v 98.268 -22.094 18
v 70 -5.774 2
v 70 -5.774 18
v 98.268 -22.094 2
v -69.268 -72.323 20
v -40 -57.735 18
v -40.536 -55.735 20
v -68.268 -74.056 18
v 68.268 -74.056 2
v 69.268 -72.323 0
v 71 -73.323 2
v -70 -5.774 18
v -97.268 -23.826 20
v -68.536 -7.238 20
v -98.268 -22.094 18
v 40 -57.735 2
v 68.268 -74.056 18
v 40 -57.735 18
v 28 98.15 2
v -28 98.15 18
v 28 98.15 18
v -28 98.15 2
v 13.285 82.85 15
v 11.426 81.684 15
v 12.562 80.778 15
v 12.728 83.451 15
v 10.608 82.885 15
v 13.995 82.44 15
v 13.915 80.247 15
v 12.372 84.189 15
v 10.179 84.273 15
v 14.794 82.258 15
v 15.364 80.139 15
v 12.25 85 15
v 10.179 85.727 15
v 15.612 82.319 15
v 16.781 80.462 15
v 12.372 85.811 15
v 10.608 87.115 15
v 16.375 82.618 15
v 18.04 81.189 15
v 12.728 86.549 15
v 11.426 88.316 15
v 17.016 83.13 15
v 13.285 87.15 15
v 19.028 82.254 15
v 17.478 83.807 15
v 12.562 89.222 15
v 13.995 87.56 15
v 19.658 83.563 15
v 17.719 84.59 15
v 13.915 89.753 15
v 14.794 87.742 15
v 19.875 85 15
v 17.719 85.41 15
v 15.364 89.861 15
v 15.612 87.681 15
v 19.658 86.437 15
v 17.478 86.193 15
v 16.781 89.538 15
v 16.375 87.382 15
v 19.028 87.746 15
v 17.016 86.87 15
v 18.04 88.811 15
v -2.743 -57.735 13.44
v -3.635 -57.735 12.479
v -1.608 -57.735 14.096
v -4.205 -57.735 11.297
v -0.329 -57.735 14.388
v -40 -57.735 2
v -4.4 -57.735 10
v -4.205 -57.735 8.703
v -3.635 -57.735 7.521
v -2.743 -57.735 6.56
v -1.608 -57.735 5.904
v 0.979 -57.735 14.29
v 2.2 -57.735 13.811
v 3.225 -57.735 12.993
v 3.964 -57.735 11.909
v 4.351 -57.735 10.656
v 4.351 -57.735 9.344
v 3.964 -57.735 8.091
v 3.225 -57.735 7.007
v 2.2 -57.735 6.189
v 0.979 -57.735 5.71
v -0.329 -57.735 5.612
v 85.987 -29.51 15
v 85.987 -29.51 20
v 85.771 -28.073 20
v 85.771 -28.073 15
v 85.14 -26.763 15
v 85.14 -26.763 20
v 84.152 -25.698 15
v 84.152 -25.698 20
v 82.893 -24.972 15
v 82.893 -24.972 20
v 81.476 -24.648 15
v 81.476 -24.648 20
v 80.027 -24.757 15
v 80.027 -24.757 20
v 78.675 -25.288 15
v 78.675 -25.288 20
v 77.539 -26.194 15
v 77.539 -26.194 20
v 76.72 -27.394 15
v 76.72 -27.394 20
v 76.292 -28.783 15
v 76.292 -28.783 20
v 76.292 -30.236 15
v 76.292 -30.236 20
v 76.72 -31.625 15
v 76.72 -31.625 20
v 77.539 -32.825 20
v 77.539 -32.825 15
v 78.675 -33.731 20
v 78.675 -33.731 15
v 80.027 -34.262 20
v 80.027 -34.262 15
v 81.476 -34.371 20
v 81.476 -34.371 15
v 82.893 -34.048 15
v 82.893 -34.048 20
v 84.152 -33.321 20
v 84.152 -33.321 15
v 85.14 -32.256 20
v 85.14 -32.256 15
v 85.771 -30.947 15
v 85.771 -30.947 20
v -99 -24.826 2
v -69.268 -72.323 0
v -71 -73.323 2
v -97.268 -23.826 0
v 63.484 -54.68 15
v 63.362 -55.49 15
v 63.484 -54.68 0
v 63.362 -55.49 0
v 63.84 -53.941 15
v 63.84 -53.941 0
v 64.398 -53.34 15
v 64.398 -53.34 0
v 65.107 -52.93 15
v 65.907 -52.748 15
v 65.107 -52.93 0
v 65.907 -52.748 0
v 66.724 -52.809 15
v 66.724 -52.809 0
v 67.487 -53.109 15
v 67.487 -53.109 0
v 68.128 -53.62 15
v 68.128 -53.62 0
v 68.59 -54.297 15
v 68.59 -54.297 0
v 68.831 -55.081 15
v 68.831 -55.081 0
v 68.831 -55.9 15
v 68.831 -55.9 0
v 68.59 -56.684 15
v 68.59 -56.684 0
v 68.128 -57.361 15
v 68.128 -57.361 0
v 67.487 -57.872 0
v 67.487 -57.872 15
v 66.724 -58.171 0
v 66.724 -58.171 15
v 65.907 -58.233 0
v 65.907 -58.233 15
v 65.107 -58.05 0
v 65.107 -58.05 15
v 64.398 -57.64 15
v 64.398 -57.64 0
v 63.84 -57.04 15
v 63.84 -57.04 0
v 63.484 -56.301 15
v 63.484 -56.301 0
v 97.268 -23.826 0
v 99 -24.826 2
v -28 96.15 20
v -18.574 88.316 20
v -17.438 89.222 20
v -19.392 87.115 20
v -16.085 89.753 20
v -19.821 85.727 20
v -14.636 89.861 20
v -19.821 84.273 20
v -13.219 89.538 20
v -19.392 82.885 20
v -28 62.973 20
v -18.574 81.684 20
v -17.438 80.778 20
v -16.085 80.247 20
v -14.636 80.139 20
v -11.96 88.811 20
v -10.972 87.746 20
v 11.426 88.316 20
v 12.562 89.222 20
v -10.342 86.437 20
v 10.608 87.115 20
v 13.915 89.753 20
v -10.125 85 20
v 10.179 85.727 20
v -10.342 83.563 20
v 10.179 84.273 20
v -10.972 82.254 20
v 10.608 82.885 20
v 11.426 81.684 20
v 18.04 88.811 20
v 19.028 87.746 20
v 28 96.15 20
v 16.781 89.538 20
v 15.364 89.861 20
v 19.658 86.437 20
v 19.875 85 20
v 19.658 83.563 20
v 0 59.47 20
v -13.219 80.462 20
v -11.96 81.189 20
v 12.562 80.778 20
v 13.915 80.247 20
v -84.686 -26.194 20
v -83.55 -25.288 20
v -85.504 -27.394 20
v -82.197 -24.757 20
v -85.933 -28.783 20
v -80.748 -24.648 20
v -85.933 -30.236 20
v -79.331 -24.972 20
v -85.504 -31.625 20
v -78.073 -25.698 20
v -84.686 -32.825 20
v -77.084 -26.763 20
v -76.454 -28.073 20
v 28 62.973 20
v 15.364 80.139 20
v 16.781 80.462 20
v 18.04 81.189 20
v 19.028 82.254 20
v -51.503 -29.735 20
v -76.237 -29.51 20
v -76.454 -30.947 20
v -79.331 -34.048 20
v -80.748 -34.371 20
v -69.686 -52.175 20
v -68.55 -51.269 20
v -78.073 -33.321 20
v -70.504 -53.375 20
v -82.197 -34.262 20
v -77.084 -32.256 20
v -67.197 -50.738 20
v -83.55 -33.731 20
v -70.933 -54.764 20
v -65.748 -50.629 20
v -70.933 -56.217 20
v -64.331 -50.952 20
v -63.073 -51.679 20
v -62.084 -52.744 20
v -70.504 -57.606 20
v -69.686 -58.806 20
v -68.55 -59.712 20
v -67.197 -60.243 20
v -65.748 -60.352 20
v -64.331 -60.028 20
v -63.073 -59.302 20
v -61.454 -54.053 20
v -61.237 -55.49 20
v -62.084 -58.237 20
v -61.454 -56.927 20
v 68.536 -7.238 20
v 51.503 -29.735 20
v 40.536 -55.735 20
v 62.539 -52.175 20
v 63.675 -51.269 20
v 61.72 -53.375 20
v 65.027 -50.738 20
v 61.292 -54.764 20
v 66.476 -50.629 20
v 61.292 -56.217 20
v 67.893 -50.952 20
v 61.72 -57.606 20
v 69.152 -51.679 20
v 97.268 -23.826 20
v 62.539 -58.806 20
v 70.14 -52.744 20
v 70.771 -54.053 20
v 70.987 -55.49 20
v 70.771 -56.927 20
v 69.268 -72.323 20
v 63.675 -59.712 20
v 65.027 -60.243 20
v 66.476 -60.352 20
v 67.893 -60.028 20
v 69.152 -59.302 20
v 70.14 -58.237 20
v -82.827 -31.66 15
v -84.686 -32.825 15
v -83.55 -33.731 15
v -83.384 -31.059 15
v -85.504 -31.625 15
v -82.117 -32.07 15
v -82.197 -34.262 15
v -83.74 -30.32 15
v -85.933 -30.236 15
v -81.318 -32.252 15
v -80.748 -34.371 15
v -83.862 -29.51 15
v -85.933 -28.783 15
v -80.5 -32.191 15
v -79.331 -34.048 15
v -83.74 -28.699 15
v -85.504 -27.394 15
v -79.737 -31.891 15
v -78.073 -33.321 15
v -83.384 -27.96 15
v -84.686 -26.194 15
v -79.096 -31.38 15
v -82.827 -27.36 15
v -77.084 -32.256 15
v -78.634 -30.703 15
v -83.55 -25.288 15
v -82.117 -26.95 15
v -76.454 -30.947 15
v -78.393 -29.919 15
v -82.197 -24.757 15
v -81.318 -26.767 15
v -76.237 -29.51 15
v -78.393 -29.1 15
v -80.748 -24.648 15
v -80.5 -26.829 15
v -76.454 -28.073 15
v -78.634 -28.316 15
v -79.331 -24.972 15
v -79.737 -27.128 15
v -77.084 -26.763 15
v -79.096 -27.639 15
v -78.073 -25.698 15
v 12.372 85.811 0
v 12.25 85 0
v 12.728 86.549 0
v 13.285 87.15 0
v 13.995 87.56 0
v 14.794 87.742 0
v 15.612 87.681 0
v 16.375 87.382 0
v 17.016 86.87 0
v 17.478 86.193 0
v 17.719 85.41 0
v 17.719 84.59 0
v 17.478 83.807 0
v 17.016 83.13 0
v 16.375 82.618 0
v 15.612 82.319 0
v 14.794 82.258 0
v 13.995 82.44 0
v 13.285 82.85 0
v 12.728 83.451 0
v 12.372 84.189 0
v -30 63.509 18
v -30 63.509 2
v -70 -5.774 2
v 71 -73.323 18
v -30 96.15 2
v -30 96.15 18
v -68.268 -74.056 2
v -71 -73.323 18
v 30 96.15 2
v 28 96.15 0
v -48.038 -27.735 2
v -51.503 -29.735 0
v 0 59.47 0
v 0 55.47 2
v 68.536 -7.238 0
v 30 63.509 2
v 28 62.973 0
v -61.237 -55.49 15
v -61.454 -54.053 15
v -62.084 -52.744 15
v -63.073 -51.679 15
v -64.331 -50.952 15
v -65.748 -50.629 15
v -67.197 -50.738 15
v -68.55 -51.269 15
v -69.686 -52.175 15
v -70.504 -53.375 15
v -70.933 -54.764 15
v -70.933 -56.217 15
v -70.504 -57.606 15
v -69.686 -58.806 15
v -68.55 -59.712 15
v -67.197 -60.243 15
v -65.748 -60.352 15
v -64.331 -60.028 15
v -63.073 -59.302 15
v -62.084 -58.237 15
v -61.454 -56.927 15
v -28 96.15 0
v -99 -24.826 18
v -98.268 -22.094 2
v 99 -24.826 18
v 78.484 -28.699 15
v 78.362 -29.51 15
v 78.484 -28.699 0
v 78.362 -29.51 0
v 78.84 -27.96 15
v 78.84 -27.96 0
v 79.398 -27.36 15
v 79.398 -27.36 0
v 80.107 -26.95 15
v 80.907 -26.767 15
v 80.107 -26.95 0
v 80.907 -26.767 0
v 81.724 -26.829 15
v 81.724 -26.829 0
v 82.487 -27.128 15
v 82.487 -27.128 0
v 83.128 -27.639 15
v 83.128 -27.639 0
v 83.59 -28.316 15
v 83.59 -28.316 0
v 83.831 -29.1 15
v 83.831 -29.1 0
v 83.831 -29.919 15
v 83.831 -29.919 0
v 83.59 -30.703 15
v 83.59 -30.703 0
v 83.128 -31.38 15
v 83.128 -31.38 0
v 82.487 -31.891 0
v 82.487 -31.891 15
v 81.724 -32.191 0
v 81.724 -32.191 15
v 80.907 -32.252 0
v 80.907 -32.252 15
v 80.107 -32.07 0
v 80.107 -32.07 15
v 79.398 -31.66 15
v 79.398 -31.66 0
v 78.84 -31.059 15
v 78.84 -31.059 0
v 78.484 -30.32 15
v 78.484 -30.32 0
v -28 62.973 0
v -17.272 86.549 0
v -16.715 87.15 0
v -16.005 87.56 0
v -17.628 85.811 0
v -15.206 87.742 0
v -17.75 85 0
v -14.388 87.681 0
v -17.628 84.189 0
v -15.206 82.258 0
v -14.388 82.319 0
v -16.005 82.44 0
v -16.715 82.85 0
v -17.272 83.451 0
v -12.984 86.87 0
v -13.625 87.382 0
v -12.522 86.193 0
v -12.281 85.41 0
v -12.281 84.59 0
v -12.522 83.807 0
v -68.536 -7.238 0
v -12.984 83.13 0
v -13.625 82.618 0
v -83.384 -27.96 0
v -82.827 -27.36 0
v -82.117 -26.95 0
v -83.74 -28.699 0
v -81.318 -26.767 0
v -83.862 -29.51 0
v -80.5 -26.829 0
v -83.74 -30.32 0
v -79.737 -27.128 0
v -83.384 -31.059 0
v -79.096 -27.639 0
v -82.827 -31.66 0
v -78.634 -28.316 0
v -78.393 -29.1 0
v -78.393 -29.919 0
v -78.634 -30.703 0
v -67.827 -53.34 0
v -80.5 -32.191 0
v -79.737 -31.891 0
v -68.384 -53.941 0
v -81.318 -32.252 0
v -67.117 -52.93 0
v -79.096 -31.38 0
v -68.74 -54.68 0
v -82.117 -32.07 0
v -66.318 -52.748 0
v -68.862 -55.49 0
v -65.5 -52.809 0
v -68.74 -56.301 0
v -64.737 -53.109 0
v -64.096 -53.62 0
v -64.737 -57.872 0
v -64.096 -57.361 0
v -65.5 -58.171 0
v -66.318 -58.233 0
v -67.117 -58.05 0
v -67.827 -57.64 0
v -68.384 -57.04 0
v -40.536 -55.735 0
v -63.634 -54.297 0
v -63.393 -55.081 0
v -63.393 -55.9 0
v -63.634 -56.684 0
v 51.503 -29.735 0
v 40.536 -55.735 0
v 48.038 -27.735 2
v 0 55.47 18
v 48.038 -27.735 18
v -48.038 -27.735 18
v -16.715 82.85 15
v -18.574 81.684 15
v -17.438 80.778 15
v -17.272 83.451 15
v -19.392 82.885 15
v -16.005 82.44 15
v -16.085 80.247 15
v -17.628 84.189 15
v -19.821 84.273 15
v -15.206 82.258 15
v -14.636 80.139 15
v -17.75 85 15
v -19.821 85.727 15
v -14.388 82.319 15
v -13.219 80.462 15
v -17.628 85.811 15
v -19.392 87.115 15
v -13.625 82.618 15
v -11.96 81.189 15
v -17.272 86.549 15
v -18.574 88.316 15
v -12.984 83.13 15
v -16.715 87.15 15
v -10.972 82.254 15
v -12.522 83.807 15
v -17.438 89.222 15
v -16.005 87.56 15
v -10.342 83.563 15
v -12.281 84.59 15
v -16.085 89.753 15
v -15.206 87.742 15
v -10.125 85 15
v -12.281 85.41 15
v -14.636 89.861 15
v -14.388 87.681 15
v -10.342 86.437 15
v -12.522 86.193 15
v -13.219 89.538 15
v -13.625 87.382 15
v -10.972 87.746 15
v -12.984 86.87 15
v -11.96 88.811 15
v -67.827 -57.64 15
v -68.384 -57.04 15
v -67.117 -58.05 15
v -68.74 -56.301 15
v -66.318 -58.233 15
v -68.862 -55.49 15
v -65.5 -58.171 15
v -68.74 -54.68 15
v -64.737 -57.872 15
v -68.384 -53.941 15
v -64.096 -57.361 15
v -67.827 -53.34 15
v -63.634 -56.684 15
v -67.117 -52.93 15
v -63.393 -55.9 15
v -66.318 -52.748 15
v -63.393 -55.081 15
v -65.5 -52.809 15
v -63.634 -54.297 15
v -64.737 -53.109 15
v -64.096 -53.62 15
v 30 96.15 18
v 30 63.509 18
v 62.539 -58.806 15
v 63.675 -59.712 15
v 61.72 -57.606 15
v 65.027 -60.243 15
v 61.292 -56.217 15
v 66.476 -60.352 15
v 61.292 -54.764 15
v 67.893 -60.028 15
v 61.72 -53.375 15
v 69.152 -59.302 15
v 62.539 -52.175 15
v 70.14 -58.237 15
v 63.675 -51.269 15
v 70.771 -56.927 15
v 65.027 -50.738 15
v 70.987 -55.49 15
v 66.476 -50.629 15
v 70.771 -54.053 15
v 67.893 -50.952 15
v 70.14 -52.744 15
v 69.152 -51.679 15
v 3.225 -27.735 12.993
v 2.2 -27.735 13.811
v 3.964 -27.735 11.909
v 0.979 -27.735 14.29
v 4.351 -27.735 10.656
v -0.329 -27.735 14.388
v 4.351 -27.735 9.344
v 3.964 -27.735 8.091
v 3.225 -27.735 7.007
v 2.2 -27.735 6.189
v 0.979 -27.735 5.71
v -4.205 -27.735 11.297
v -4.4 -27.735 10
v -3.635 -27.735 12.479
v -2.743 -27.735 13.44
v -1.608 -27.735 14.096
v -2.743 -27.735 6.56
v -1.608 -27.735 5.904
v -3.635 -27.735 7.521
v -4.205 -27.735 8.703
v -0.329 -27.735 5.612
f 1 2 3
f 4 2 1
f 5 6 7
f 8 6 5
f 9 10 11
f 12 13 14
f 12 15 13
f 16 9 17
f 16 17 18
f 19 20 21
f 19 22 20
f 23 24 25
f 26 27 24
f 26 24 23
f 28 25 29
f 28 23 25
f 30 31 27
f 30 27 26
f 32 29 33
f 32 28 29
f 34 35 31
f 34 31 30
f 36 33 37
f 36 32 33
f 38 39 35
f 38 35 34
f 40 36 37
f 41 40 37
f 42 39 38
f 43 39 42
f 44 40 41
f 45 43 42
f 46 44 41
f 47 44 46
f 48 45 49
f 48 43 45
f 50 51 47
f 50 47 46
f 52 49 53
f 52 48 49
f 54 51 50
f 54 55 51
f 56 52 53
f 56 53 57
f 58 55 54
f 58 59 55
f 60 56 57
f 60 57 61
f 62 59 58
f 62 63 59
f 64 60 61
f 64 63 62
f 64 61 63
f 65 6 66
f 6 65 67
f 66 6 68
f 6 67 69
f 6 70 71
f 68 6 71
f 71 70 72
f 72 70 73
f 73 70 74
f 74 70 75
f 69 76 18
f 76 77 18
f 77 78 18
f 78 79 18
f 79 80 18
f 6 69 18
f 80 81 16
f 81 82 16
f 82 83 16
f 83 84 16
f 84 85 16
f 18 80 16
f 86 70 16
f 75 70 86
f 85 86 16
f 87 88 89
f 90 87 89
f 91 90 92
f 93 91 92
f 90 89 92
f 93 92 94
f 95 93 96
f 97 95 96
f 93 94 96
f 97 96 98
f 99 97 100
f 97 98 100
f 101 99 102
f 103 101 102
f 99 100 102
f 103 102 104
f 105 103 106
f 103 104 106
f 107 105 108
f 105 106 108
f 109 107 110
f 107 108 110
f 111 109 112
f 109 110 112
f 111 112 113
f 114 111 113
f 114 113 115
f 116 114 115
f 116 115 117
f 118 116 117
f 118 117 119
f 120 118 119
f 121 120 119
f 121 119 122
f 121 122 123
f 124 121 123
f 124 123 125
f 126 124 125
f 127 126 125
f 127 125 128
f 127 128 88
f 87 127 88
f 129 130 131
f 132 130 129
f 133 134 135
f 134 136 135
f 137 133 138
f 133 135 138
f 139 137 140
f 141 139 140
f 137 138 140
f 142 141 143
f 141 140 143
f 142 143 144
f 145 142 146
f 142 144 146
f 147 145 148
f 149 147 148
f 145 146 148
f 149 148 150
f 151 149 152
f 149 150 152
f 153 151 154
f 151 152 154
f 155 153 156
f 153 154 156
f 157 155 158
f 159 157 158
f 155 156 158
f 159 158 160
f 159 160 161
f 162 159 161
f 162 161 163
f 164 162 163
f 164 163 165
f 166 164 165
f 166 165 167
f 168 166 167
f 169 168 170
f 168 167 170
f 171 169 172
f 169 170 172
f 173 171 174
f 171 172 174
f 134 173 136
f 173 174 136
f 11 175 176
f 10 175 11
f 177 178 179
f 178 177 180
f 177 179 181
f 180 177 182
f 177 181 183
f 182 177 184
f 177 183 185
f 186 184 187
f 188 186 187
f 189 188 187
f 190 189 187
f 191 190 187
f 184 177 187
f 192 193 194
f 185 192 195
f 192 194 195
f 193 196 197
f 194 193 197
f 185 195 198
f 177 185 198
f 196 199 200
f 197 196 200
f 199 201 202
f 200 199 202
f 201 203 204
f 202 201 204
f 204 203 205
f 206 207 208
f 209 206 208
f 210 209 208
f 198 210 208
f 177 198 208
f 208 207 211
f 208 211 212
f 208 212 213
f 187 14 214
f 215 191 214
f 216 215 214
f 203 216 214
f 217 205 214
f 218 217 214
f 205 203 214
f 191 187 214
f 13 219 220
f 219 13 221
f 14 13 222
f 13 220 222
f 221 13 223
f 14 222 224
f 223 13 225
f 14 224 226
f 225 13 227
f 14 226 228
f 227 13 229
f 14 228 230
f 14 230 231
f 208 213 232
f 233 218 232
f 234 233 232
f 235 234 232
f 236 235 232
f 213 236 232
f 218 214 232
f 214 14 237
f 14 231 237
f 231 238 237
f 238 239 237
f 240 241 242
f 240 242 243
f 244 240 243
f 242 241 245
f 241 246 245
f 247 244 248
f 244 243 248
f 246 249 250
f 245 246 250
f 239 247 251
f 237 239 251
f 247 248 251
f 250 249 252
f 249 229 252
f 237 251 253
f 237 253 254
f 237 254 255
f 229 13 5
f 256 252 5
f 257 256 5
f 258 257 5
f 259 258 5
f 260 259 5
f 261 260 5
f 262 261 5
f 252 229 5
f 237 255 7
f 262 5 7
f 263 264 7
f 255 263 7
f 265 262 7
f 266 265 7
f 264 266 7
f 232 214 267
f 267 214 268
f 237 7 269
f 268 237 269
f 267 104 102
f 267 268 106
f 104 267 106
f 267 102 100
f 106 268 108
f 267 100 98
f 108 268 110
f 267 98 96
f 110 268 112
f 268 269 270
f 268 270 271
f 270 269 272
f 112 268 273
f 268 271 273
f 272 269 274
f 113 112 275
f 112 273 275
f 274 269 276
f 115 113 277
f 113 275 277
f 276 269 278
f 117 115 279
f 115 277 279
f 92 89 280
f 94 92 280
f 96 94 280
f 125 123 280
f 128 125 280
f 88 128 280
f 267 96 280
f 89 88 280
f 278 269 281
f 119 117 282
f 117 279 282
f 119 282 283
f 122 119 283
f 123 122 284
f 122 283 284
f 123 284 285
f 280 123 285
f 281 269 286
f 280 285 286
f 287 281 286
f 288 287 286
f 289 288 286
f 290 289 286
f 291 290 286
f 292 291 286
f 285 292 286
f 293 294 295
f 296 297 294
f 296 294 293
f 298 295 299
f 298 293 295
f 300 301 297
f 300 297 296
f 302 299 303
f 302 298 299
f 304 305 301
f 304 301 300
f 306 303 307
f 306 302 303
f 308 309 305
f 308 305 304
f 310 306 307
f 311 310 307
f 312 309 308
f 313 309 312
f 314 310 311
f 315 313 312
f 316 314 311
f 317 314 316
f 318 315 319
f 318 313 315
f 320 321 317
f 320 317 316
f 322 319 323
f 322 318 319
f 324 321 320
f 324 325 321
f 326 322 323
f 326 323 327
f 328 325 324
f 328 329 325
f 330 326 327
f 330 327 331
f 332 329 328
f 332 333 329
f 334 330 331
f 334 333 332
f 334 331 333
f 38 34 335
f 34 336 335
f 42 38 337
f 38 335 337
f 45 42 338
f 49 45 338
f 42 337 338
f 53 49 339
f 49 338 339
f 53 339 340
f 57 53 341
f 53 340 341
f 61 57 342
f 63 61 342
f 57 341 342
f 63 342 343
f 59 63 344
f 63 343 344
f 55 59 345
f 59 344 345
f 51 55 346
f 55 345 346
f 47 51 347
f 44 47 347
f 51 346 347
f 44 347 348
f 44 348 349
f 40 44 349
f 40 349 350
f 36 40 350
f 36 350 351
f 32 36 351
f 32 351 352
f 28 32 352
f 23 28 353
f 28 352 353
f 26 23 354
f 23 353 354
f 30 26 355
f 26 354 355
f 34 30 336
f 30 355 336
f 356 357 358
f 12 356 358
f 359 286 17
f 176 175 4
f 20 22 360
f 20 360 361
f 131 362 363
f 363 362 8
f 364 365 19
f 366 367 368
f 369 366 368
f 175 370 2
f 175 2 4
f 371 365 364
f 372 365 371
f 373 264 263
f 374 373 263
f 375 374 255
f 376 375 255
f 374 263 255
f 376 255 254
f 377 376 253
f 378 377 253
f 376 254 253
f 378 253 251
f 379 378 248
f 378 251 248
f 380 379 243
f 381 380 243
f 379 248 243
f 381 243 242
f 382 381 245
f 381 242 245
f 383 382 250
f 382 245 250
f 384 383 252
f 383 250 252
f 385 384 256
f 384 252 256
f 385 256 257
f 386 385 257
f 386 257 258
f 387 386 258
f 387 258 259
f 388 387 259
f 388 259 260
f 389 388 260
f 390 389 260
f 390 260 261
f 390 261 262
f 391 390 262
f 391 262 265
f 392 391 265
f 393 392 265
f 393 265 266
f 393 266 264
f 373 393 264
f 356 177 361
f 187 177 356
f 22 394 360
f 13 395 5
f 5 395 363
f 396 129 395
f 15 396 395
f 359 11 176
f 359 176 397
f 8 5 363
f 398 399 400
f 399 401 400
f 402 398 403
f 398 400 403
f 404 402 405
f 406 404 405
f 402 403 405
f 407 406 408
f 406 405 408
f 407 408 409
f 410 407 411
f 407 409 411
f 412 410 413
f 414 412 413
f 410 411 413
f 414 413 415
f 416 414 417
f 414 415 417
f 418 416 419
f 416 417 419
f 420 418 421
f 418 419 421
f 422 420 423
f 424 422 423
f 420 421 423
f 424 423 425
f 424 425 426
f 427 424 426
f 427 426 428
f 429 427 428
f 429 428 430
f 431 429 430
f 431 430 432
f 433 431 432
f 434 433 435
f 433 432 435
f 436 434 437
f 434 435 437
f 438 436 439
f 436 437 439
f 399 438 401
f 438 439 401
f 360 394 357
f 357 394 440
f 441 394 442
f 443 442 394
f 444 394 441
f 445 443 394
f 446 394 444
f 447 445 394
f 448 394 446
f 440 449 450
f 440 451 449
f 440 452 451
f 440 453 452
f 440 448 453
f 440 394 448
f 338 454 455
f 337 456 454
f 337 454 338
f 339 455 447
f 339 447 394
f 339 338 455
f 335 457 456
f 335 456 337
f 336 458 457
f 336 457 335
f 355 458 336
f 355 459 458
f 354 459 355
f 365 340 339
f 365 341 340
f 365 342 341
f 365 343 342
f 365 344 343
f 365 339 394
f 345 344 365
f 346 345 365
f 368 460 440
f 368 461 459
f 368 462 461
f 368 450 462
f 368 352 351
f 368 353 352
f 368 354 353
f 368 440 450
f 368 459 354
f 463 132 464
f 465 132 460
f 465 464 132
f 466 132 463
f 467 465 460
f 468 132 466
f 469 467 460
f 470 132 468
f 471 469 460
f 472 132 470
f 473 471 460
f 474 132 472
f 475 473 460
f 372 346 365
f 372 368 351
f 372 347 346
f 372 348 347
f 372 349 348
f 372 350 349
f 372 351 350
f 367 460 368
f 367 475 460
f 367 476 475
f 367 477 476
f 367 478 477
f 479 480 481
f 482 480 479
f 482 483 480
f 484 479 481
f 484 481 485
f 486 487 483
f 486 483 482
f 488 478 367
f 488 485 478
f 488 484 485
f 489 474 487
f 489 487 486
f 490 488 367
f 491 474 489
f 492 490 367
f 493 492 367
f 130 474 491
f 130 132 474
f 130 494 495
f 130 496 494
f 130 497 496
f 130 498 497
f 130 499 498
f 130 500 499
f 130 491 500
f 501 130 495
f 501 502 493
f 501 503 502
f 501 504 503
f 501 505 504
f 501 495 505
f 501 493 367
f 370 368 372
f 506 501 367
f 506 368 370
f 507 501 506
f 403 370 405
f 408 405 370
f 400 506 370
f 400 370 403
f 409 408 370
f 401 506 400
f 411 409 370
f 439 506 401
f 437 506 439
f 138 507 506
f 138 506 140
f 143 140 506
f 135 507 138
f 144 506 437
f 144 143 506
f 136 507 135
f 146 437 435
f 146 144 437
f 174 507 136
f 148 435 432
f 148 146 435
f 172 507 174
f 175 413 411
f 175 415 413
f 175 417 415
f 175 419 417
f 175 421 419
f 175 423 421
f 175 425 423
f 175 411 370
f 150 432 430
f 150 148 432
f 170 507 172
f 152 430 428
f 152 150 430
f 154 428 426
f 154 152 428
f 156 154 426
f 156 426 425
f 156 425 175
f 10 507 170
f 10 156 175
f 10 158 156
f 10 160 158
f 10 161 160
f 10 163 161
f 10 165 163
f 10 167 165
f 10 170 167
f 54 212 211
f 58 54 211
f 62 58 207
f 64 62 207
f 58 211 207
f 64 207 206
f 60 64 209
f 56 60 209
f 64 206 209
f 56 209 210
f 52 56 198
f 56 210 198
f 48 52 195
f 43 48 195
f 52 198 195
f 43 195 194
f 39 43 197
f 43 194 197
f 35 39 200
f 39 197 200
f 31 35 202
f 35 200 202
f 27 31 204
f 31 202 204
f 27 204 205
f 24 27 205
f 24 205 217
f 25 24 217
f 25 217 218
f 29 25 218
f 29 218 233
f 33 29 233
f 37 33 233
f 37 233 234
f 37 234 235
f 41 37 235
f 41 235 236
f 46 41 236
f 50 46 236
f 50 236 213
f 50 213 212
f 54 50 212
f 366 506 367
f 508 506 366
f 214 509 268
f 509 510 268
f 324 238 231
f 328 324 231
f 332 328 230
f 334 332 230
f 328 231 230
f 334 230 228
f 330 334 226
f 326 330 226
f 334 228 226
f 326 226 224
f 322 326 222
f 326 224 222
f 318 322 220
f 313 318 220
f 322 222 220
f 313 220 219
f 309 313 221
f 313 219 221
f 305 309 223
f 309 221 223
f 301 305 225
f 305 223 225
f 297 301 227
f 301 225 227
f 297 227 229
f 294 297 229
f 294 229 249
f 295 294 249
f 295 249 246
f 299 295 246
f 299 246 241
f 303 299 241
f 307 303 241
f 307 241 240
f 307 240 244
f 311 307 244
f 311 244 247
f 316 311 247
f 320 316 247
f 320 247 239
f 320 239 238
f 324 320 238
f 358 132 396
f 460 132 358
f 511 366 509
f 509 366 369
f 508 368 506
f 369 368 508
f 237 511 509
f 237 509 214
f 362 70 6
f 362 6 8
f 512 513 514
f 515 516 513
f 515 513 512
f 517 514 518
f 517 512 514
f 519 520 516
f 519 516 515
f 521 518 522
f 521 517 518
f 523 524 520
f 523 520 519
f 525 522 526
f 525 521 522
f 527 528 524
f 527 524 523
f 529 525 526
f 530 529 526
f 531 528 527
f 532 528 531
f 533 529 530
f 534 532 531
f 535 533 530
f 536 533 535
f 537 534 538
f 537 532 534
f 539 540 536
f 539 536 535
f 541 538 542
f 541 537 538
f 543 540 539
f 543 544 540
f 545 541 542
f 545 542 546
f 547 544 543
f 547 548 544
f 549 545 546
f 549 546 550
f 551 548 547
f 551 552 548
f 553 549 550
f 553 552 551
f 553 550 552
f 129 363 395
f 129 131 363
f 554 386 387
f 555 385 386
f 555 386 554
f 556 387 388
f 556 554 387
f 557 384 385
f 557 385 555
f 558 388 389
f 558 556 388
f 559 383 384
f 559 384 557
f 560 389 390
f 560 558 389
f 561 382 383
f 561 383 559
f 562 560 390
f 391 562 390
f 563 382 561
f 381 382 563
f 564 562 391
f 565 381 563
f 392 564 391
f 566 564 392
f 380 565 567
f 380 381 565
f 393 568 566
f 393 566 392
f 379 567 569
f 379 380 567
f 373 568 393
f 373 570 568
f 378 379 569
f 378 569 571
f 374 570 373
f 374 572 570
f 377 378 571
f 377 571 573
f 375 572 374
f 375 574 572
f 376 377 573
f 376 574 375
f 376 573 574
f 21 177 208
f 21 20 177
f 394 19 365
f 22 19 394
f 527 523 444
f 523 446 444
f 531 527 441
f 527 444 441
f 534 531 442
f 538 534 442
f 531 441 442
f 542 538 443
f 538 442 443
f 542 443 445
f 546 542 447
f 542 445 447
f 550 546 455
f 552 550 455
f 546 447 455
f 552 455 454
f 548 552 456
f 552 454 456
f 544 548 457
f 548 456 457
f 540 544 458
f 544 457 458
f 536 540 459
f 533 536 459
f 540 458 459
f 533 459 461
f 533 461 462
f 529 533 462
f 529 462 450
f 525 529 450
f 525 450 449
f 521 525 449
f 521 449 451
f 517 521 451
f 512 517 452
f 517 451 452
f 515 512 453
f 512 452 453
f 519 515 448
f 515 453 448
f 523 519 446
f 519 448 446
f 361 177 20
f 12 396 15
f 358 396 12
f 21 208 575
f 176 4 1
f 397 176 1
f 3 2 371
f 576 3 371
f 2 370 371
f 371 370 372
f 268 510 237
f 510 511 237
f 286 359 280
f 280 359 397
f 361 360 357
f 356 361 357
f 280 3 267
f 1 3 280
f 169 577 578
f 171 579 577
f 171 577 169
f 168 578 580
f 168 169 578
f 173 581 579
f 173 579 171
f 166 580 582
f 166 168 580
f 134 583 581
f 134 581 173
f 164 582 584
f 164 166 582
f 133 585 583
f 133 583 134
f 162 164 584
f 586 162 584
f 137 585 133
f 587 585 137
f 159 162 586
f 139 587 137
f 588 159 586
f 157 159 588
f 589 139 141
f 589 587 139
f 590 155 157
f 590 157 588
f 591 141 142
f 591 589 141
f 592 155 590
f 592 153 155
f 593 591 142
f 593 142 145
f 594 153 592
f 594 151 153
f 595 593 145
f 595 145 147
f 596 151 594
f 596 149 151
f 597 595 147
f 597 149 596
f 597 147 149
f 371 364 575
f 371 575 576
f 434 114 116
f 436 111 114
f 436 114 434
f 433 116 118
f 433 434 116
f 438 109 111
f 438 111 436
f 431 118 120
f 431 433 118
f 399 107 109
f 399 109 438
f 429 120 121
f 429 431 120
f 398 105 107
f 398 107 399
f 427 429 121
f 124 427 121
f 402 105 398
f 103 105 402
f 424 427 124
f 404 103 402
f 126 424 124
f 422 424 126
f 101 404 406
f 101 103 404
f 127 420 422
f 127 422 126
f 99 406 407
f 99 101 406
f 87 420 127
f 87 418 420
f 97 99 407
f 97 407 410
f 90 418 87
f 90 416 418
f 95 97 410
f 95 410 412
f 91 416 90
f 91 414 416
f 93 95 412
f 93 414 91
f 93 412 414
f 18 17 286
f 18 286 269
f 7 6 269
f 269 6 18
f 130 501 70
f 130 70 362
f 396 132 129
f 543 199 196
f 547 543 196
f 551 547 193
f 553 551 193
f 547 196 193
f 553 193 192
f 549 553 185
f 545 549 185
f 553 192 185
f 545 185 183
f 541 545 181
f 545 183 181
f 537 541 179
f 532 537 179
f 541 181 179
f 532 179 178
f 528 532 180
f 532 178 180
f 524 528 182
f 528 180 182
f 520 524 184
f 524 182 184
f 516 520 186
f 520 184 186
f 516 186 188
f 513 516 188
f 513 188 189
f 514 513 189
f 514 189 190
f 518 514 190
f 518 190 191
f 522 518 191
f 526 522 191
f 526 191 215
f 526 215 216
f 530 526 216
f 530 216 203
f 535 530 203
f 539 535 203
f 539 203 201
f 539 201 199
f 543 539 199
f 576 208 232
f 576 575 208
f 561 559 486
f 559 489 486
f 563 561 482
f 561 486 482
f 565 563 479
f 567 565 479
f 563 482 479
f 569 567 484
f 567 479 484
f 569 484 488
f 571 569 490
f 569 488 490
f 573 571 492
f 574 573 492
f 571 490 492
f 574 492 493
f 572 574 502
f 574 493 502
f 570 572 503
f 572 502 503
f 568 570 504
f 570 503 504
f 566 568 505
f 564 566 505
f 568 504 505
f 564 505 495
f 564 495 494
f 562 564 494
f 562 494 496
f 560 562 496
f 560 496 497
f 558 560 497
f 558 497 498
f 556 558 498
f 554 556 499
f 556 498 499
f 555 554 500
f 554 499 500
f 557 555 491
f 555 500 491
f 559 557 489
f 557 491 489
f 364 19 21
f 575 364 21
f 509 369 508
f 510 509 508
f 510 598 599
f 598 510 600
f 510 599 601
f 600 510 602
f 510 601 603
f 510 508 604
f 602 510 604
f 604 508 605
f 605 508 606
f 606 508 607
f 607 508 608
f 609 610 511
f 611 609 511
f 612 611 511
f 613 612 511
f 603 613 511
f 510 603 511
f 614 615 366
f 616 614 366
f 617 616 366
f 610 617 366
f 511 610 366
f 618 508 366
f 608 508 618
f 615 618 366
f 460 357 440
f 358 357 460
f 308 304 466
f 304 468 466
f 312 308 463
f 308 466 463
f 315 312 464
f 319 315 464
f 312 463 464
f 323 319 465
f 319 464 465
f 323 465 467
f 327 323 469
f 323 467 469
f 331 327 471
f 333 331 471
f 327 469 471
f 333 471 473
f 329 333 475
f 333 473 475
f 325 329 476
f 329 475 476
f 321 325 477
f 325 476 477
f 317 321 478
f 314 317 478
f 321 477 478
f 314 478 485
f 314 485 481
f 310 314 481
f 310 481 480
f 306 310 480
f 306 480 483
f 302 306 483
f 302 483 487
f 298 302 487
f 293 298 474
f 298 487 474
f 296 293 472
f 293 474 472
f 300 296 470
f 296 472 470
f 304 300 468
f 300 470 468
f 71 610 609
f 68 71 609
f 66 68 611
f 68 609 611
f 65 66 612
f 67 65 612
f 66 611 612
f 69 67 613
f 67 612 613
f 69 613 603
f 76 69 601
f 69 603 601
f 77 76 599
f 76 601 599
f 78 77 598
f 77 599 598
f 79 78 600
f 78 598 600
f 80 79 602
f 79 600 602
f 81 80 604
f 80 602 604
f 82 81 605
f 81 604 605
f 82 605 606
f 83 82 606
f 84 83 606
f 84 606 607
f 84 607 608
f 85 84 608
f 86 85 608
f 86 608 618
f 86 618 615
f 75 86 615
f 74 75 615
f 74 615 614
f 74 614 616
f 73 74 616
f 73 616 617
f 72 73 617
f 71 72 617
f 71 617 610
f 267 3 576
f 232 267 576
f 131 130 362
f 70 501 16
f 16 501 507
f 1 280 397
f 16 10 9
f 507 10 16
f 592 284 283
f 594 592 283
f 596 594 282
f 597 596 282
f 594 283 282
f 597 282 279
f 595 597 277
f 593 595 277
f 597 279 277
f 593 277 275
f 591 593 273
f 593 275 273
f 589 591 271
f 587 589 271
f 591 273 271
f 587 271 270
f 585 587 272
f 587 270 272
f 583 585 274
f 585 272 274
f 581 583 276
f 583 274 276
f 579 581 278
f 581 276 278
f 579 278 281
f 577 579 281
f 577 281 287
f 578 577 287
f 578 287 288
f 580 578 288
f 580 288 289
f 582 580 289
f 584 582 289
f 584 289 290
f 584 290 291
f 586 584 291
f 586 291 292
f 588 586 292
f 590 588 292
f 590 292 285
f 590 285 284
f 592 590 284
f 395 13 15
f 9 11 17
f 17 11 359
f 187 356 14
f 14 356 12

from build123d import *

# Parameters (mm, degrees)
F1_DEPTH       = 20
F2_SIZE        = 20
F3_W           = 60
F3_H           = 34.6410161514
F4_DEPTH       = 20
F5_SIZE        = 2
F7_D           = 5.5
F7_CBORE_D     = 9.75
F7_CBORE_DEPTH = 5
F9_D           = 8.8
F9_DEPTH       = 51.35
F9_TIP         = 2.6437867237


with BuildPart() as f1:
    # F0 (on Top) → F1 (new body)
    with BuildSketch(Plane.XY):
        Polygon((0, 115.4700538379), (-100, -57.735026919), (100, -57.735026919), align=None)
        Polygon((-48.0384757729, -27.735026919), (0, 55.4700538379), (48.0384757729, -27.735026919), align=None, mode=Mode.SUBTRACT)
    extrude(amount=F1_DEPTH)

    # F2
    f2_edges = [f1.edges().sort_by_distance(p)[0] for p in [
        (-100, -57.735027, 10),
        (100, -57.735027, 10),
        (0, 115.470054, 10),
    ]]
    chamfer(f2_edges, length=F2_SIZE)

    # F3 (on face) → F4 (join, through all)
    with BuildSketch(Plane(origin=(0, 0, 0), x_dir=(1, 0, 0), z_dir=(0, 0, -1))):
        with Locations((0, -80.8290376865)):
            Rectangle(F3_W, F3_H)
        Polygon((70, 5.7735026919), (100, 23.0940107676), (70, 75.0555349947), (40, 57.735026919), align=None)
        Polygon((-40, 57.735026919), (-70, 75.0555349947), (-100, 23.0940107676), (-70, 5.7735026919), align=None)
    extrude(amount=-F4_DEPTH)

    # F5
    f5_edges = [f1.edges().sort_by_distance(p)[0] for p in [
        (85, -49.074773, 20),
        (85, -14.433757, 20),
        (50, 28.867513, 20),
        (30, 80.829038, 20),
        (0, 98.149546, 20),
        (-30, 80.829038, 20),
        (-50, 28.867513, 20),
        (-85, -14.433757, 20),
        (-85, -49.074773, 20),
        (-55, -66.395281, 20),
        (0, -57.735027, 20),
        (55, -66.395281, 20),
        (-24.019238, 13.867513, 20),
        (24.019238, 13.867513, 20),
        (0, -27.735027, 20),
        (85, -49.074773, 0),
        (85, -14.433757, 0),
        (50, 28.867513, 0),
        (30, 80.829038, 0),
        (0, 98.149546, 0),
        (-30, 80.829038, 0),
        (-50, 28.867513, 0),
        (-85, -14.433757, 0),
        (-85, -49.074773, 0),
        (-55, -66.395281, 0),
        (0, -57.735027, 0),
        (55, -66.395281, 0),
        (-24.019238, 13.867513, 0),
        (24.019238, 13.867513, 0),
        (0, -27.735027, 0),
        (100, -23.094011, 10),
        (70, -75.055535, 10),
        (30, 98.149546, 10),
        (-30, 98.149546, 10),
        (-100, -23.094011, 10),
        (-70, -75.055535, 10),
    ]]
    chamfer(f5_edges, length=F5_SIZE)

    # F7 (through all)
    with Locations(Plane.XY.offset(20)):
        with Locations((-66.1121593217, -55.4903810568), (-81.1121593217, -29.5096189432), (-15, 85), (15, 85), (81.1121593217, -29.5096189432), (66.1121593217, -55.4903810568)):
            CounterBoreHole(F7_D / 2, F7_CBORE_D / 2, F7_CBORE_DEPTH)

    # F9
    with Locations(Plane.XZ.offset(57.735026919)):
        with Locations((0, 10)):
            Hole(F9_D / 2, depth=F9_DEPTH)
            with Locations((0, 0, -(F9_DEPTH + F9_TIP / 2))):  # 118° drill point
                Cone(0, F9_D / 2, F9_TIP, mode=Mode.SUBTRACT)


solid = f1.part
